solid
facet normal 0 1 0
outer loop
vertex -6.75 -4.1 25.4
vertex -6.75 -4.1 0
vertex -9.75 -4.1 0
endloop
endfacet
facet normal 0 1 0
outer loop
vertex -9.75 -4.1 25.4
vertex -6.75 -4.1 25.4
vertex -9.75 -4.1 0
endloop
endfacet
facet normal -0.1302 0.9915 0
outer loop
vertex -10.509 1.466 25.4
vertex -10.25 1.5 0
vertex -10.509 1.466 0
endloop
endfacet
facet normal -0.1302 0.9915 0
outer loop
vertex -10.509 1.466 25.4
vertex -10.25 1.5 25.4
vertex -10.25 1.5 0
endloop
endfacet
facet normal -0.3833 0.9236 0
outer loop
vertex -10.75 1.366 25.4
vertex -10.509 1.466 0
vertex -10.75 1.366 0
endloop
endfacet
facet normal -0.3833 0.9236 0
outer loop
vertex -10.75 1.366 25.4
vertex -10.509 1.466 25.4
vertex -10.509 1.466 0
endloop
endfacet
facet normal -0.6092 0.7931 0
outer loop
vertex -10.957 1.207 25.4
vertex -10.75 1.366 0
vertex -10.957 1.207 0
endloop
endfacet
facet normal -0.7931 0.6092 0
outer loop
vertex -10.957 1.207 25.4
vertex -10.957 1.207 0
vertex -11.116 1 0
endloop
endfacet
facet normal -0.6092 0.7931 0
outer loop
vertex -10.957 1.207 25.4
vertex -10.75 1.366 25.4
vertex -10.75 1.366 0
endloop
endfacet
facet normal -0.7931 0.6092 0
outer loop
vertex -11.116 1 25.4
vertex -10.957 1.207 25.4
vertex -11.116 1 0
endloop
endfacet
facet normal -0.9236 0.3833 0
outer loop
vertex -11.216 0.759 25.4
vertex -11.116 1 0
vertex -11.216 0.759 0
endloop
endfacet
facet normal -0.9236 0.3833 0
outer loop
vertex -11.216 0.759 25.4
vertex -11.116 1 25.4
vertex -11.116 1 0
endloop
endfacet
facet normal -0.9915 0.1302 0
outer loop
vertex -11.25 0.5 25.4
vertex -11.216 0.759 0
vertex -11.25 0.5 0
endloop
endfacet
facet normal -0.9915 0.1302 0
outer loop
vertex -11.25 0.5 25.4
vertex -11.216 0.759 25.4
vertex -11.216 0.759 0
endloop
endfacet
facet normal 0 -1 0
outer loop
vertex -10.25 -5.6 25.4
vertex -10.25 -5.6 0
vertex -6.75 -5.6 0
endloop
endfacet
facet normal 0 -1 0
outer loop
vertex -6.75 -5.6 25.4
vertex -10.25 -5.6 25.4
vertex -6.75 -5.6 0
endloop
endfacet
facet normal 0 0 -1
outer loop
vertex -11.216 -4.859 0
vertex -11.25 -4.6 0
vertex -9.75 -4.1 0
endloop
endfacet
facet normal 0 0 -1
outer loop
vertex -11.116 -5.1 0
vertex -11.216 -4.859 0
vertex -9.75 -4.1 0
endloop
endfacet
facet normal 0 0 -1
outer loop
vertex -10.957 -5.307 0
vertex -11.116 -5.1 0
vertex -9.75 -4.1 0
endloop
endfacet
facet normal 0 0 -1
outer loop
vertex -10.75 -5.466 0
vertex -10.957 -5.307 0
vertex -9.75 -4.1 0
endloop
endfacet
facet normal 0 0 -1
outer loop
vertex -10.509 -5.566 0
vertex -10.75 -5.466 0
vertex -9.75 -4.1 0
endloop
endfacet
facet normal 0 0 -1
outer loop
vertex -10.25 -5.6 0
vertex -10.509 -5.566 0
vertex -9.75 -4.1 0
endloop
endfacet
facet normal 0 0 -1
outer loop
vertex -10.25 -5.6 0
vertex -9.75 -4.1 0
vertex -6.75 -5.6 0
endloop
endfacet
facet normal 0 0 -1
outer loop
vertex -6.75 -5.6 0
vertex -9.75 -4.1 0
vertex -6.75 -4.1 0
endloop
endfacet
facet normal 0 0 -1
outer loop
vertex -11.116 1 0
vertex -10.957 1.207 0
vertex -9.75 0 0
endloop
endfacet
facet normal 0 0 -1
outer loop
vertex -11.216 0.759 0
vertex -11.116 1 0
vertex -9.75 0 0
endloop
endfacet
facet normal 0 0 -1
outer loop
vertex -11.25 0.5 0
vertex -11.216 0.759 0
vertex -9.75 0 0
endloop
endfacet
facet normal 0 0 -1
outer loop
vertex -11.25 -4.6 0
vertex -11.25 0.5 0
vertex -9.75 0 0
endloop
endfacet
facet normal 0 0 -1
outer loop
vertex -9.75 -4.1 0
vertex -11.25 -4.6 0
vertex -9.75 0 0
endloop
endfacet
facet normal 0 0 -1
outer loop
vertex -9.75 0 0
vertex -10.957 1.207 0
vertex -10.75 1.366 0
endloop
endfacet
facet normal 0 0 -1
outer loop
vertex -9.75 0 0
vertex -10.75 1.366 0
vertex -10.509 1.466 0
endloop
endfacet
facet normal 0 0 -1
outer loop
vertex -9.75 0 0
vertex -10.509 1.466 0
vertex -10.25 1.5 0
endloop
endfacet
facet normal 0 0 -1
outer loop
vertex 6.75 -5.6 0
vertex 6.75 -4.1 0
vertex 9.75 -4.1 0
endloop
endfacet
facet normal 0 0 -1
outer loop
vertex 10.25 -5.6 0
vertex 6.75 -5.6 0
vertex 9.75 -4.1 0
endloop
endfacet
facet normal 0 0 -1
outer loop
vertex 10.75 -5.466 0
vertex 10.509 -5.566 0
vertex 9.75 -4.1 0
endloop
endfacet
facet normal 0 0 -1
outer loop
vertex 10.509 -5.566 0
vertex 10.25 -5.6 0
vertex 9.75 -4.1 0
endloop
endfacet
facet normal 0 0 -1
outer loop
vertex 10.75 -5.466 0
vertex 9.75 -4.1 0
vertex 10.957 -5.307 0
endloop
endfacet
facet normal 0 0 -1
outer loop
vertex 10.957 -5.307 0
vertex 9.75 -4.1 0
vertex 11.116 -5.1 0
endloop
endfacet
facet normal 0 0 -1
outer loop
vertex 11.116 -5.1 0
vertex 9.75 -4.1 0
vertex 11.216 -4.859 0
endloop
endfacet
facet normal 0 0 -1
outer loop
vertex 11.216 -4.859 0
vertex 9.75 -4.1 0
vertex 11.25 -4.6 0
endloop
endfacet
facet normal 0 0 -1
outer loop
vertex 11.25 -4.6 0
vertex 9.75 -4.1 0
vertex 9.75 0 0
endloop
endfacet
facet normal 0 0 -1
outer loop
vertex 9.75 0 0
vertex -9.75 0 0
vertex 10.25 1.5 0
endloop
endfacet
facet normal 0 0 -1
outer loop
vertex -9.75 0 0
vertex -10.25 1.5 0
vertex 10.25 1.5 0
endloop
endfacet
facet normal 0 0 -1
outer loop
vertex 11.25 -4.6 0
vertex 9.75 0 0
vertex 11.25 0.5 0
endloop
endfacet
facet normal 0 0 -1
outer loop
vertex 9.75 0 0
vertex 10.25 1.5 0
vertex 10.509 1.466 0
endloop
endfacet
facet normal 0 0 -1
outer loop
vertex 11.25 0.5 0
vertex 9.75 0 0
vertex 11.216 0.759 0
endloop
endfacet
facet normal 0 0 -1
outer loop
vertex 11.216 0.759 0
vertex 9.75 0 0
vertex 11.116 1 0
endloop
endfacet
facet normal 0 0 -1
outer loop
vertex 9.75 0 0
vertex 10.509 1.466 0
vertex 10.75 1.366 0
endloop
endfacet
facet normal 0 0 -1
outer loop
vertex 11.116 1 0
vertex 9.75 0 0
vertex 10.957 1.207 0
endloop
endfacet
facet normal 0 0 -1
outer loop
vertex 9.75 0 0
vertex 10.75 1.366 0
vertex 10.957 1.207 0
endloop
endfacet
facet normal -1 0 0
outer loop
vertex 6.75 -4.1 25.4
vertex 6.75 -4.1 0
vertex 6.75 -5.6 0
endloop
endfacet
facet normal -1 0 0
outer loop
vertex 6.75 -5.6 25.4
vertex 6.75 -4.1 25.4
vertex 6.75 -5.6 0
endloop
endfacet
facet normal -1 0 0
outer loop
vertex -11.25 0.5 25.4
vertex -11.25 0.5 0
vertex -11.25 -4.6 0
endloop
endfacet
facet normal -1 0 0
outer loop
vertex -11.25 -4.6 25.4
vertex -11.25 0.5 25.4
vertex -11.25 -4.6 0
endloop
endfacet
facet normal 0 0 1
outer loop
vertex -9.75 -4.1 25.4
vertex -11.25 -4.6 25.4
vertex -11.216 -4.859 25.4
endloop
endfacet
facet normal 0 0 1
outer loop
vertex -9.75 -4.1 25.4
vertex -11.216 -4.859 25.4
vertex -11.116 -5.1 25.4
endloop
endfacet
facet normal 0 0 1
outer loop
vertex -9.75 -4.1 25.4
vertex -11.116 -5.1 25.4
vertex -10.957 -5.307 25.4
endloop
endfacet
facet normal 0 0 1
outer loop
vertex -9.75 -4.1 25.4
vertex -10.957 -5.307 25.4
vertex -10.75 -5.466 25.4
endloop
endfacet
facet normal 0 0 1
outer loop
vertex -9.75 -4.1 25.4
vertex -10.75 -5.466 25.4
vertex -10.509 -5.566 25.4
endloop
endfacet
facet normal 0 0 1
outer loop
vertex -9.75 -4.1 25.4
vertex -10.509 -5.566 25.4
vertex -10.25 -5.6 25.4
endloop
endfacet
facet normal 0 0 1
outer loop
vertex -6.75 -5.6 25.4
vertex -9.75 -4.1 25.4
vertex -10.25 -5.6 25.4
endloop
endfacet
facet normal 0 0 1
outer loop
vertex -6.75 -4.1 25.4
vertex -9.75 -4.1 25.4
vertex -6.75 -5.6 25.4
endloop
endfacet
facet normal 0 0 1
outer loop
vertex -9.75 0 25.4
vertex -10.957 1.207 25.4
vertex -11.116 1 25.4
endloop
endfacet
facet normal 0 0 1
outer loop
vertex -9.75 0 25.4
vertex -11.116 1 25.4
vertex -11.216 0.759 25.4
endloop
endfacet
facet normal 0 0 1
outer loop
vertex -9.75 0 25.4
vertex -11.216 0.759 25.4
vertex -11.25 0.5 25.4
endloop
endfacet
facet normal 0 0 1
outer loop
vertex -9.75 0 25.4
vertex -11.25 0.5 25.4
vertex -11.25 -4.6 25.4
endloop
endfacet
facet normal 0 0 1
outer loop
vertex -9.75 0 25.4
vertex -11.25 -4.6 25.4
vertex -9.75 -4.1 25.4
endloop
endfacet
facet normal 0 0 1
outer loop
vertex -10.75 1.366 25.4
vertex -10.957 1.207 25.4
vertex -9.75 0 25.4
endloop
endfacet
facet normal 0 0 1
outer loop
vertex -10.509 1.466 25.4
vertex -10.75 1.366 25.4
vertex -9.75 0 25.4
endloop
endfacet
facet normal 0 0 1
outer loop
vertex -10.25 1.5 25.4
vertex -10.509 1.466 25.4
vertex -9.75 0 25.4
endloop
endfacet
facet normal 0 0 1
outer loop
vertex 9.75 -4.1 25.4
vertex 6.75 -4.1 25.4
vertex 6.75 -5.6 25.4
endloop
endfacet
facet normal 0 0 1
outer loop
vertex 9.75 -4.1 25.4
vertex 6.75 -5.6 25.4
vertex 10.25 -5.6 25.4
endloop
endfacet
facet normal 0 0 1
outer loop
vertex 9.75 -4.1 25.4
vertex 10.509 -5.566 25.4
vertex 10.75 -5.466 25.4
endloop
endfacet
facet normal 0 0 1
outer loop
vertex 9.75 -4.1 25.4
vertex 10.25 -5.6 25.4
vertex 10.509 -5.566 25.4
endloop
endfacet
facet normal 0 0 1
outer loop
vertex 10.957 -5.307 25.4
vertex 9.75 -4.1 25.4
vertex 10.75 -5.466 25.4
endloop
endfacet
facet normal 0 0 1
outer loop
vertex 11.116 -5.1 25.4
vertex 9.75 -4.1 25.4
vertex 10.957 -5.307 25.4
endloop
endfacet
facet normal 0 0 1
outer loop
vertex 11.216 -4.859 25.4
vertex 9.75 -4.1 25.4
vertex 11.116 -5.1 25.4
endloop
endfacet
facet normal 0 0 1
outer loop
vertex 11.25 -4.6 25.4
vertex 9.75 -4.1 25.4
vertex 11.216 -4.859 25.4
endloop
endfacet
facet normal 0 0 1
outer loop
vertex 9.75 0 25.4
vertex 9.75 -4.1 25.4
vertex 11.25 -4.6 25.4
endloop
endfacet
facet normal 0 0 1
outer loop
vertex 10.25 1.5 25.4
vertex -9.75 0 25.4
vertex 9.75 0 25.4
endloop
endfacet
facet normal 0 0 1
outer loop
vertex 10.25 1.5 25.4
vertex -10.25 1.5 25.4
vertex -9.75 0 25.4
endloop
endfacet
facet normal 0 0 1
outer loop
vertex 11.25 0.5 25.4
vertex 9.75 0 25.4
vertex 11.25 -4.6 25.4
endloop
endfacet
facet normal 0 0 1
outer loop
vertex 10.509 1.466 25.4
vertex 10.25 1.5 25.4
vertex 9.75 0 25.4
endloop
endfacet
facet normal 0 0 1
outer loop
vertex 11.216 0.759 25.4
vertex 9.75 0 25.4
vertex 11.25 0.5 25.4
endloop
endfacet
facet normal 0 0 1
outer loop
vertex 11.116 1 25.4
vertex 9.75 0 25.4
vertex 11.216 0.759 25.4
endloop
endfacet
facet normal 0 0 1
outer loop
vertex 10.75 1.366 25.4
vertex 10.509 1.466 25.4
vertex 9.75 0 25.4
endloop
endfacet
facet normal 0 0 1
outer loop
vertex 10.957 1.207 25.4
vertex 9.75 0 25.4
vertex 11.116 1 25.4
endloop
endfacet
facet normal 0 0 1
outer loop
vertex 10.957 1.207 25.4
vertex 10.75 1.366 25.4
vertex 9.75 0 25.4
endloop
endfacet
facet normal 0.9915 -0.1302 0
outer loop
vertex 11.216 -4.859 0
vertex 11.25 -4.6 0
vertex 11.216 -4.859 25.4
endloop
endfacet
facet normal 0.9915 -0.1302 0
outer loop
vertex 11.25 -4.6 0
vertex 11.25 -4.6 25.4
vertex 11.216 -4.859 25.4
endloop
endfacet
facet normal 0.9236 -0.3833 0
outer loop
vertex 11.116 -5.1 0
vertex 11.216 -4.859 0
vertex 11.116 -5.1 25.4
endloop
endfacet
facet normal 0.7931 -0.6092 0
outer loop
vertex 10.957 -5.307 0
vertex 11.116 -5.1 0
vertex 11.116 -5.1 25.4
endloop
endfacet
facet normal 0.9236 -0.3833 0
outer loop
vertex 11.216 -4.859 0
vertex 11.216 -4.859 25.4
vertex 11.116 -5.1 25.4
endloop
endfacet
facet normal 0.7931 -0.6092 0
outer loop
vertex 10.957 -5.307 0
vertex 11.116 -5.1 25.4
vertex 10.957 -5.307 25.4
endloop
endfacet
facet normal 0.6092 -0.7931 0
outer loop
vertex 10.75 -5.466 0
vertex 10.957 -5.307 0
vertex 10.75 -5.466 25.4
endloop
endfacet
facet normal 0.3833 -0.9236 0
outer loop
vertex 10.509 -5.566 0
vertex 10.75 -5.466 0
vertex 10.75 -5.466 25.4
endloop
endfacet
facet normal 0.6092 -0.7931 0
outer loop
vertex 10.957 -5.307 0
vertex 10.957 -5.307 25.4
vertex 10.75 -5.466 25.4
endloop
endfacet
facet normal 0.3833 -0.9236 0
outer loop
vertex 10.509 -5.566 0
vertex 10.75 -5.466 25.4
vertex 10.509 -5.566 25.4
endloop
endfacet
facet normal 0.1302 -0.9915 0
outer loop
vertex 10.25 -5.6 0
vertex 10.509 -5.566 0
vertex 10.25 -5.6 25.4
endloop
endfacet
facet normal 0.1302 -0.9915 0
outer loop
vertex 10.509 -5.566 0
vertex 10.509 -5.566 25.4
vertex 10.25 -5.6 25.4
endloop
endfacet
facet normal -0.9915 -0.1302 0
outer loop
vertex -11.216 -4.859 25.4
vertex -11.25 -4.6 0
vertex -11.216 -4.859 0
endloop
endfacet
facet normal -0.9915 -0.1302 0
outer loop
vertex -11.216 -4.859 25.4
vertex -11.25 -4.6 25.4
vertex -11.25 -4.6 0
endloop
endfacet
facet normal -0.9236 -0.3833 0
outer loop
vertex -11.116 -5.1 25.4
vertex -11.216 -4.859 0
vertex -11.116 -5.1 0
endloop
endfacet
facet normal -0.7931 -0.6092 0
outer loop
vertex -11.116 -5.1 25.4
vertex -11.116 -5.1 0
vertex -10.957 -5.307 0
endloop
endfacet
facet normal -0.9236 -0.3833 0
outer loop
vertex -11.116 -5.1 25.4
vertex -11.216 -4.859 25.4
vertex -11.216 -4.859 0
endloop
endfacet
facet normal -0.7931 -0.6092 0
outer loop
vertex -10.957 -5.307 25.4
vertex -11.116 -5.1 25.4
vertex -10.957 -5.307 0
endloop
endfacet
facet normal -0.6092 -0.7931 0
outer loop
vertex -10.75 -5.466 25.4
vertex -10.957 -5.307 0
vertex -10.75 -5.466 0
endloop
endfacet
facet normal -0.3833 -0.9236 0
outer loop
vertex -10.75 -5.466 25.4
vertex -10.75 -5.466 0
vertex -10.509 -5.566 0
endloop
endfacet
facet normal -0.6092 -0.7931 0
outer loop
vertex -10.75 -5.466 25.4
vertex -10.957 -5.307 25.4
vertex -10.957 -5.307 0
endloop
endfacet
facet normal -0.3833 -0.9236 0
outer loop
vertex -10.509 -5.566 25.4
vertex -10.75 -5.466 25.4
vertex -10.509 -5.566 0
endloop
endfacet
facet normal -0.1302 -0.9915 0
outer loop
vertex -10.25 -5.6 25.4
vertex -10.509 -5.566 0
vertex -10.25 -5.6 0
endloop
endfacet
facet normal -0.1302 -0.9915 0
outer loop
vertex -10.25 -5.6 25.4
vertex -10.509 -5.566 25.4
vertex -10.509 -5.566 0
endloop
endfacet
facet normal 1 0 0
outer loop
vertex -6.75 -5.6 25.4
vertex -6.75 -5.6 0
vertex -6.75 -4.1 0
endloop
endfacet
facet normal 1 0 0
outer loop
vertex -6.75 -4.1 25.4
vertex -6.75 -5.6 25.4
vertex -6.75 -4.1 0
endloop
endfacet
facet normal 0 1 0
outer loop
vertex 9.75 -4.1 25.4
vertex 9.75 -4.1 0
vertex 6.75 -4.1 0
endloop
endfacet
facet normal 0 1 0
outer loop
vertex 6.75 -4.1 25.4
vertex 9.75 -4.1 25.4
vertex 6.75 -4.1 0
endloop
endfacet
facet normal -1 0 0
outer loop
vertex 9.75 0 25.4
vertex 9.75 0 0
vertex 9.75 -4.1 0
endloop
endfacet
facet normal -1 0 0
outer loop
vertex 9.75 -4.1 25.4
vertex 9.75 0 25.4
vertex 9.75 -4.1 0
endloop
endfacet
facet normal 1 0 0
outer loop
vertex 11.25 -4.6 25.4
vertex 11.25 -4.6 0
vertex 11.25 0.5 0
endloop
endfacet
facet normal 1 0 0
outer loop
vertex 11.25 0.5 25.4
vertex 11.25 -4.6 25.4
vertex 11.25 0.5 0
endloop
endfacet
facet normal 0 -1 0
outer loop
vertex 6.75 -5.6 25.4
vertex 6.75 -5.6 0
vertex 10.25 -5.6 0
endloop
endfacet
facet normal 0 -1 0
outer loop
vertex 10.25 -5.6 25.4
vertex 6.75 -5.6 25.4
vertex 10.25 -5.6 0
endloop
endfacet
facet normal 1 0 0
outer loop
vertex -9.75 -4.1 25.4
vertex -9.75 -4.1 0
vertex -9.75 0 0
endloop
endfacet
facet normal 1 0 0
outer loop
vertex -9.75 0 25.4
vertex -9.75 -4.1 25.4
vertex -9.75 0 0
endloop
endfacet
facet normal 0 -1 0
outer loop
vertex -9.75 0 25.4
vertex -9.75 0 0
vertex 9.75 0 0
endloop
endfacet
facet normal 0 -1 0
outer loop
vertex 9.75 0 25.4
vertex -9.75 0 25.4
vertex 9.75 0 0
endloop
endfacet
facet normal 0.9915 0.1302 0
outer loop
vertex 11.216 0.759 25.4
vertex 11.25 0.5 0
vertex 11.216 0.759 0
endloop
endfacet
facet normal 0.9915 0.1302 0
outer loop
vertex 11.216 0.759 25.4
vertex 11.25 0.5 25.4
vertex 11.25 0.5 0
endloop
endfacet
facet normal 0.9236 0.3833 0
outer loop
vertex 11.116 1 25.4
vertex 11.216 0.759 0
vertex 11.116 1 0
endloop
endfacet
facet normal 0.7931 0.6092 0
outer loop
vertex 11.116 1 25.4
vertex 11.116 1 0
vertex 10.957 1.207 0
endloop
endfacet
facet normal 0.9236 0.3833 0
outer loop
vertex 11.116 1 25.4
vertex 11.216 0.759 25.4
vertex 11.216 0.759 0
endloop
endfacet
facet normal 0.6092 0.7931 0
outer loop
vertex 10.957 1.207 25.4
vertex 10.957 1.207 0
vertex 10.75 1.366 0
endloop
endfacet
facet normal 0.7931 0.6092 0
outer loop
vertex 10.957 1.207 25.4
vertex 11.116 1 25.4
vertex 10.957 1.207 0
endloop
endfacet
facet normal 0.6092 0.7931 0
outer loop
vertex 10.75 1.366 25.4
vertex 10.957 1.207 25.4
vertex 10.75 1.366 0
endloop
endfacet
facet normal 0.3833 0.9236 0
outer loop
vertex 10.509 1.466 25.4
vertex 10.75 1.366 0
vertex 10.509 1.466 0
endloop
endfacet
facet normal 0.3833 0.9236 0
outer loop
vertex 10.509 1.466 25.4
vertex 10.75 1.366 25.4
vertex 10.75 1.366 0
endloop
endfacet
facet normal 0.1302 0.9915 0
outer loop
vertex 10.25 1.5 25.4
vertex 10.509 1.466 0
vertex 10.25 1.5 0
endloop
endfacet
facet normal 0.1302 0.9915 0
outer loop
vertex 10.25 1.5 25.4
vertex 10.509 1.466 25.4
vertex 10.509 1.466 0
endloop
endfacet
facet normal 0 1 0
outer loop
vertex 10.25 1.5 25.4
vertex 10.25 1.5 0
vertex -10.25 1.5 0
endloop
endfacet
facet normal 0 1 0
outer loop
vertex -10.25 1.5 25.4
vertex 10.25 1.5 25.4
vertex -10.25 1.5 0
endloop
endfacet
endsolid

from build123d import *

# Parameters (mm, degrees)
F1_DEPTH = 25.4
F2_R     = 1
F3_R     = 1


with BuildPart() as f1:
    # F0 (on Top) → F1 (new body)
    with BuildSketch(Plane.XY):
        Polygon((-9.75, 0), (0, 0), (0, 1.5), (-11.25, 1.5), (-11.25, -5.6), (-6.75, -5.6), (-6.75, -4.1), (-9.75, -4.1), align=None)
        Polygon((0, 1.5), (0, 0), (9.75, 0), (9.75, -4.1), (6.75, -4.1), (6.75, -5.6), (11.25, -5.6), (11.25, 1.5), align=None)
    extrude(amount=F1_DEPTH)

    # F2
    f2_edges = [f1.edges().sort_by_distance(p)[0] for p in [
        (-11.25, 1.5, 12.7),
        (11.25, 1.5, 12.7),
    ]]
    fillet(f2_edges, radius=F2_R)

    # F3
    f3_edges = [f1.edges().sort_by_distance(p)[0] for p in [
        (-11.25, -5.6, 12.7),
        (11.25, -5.6, 12.7),
    ]]
    fillet(f3_edges, radius=F3_R)


solid = f1.part
